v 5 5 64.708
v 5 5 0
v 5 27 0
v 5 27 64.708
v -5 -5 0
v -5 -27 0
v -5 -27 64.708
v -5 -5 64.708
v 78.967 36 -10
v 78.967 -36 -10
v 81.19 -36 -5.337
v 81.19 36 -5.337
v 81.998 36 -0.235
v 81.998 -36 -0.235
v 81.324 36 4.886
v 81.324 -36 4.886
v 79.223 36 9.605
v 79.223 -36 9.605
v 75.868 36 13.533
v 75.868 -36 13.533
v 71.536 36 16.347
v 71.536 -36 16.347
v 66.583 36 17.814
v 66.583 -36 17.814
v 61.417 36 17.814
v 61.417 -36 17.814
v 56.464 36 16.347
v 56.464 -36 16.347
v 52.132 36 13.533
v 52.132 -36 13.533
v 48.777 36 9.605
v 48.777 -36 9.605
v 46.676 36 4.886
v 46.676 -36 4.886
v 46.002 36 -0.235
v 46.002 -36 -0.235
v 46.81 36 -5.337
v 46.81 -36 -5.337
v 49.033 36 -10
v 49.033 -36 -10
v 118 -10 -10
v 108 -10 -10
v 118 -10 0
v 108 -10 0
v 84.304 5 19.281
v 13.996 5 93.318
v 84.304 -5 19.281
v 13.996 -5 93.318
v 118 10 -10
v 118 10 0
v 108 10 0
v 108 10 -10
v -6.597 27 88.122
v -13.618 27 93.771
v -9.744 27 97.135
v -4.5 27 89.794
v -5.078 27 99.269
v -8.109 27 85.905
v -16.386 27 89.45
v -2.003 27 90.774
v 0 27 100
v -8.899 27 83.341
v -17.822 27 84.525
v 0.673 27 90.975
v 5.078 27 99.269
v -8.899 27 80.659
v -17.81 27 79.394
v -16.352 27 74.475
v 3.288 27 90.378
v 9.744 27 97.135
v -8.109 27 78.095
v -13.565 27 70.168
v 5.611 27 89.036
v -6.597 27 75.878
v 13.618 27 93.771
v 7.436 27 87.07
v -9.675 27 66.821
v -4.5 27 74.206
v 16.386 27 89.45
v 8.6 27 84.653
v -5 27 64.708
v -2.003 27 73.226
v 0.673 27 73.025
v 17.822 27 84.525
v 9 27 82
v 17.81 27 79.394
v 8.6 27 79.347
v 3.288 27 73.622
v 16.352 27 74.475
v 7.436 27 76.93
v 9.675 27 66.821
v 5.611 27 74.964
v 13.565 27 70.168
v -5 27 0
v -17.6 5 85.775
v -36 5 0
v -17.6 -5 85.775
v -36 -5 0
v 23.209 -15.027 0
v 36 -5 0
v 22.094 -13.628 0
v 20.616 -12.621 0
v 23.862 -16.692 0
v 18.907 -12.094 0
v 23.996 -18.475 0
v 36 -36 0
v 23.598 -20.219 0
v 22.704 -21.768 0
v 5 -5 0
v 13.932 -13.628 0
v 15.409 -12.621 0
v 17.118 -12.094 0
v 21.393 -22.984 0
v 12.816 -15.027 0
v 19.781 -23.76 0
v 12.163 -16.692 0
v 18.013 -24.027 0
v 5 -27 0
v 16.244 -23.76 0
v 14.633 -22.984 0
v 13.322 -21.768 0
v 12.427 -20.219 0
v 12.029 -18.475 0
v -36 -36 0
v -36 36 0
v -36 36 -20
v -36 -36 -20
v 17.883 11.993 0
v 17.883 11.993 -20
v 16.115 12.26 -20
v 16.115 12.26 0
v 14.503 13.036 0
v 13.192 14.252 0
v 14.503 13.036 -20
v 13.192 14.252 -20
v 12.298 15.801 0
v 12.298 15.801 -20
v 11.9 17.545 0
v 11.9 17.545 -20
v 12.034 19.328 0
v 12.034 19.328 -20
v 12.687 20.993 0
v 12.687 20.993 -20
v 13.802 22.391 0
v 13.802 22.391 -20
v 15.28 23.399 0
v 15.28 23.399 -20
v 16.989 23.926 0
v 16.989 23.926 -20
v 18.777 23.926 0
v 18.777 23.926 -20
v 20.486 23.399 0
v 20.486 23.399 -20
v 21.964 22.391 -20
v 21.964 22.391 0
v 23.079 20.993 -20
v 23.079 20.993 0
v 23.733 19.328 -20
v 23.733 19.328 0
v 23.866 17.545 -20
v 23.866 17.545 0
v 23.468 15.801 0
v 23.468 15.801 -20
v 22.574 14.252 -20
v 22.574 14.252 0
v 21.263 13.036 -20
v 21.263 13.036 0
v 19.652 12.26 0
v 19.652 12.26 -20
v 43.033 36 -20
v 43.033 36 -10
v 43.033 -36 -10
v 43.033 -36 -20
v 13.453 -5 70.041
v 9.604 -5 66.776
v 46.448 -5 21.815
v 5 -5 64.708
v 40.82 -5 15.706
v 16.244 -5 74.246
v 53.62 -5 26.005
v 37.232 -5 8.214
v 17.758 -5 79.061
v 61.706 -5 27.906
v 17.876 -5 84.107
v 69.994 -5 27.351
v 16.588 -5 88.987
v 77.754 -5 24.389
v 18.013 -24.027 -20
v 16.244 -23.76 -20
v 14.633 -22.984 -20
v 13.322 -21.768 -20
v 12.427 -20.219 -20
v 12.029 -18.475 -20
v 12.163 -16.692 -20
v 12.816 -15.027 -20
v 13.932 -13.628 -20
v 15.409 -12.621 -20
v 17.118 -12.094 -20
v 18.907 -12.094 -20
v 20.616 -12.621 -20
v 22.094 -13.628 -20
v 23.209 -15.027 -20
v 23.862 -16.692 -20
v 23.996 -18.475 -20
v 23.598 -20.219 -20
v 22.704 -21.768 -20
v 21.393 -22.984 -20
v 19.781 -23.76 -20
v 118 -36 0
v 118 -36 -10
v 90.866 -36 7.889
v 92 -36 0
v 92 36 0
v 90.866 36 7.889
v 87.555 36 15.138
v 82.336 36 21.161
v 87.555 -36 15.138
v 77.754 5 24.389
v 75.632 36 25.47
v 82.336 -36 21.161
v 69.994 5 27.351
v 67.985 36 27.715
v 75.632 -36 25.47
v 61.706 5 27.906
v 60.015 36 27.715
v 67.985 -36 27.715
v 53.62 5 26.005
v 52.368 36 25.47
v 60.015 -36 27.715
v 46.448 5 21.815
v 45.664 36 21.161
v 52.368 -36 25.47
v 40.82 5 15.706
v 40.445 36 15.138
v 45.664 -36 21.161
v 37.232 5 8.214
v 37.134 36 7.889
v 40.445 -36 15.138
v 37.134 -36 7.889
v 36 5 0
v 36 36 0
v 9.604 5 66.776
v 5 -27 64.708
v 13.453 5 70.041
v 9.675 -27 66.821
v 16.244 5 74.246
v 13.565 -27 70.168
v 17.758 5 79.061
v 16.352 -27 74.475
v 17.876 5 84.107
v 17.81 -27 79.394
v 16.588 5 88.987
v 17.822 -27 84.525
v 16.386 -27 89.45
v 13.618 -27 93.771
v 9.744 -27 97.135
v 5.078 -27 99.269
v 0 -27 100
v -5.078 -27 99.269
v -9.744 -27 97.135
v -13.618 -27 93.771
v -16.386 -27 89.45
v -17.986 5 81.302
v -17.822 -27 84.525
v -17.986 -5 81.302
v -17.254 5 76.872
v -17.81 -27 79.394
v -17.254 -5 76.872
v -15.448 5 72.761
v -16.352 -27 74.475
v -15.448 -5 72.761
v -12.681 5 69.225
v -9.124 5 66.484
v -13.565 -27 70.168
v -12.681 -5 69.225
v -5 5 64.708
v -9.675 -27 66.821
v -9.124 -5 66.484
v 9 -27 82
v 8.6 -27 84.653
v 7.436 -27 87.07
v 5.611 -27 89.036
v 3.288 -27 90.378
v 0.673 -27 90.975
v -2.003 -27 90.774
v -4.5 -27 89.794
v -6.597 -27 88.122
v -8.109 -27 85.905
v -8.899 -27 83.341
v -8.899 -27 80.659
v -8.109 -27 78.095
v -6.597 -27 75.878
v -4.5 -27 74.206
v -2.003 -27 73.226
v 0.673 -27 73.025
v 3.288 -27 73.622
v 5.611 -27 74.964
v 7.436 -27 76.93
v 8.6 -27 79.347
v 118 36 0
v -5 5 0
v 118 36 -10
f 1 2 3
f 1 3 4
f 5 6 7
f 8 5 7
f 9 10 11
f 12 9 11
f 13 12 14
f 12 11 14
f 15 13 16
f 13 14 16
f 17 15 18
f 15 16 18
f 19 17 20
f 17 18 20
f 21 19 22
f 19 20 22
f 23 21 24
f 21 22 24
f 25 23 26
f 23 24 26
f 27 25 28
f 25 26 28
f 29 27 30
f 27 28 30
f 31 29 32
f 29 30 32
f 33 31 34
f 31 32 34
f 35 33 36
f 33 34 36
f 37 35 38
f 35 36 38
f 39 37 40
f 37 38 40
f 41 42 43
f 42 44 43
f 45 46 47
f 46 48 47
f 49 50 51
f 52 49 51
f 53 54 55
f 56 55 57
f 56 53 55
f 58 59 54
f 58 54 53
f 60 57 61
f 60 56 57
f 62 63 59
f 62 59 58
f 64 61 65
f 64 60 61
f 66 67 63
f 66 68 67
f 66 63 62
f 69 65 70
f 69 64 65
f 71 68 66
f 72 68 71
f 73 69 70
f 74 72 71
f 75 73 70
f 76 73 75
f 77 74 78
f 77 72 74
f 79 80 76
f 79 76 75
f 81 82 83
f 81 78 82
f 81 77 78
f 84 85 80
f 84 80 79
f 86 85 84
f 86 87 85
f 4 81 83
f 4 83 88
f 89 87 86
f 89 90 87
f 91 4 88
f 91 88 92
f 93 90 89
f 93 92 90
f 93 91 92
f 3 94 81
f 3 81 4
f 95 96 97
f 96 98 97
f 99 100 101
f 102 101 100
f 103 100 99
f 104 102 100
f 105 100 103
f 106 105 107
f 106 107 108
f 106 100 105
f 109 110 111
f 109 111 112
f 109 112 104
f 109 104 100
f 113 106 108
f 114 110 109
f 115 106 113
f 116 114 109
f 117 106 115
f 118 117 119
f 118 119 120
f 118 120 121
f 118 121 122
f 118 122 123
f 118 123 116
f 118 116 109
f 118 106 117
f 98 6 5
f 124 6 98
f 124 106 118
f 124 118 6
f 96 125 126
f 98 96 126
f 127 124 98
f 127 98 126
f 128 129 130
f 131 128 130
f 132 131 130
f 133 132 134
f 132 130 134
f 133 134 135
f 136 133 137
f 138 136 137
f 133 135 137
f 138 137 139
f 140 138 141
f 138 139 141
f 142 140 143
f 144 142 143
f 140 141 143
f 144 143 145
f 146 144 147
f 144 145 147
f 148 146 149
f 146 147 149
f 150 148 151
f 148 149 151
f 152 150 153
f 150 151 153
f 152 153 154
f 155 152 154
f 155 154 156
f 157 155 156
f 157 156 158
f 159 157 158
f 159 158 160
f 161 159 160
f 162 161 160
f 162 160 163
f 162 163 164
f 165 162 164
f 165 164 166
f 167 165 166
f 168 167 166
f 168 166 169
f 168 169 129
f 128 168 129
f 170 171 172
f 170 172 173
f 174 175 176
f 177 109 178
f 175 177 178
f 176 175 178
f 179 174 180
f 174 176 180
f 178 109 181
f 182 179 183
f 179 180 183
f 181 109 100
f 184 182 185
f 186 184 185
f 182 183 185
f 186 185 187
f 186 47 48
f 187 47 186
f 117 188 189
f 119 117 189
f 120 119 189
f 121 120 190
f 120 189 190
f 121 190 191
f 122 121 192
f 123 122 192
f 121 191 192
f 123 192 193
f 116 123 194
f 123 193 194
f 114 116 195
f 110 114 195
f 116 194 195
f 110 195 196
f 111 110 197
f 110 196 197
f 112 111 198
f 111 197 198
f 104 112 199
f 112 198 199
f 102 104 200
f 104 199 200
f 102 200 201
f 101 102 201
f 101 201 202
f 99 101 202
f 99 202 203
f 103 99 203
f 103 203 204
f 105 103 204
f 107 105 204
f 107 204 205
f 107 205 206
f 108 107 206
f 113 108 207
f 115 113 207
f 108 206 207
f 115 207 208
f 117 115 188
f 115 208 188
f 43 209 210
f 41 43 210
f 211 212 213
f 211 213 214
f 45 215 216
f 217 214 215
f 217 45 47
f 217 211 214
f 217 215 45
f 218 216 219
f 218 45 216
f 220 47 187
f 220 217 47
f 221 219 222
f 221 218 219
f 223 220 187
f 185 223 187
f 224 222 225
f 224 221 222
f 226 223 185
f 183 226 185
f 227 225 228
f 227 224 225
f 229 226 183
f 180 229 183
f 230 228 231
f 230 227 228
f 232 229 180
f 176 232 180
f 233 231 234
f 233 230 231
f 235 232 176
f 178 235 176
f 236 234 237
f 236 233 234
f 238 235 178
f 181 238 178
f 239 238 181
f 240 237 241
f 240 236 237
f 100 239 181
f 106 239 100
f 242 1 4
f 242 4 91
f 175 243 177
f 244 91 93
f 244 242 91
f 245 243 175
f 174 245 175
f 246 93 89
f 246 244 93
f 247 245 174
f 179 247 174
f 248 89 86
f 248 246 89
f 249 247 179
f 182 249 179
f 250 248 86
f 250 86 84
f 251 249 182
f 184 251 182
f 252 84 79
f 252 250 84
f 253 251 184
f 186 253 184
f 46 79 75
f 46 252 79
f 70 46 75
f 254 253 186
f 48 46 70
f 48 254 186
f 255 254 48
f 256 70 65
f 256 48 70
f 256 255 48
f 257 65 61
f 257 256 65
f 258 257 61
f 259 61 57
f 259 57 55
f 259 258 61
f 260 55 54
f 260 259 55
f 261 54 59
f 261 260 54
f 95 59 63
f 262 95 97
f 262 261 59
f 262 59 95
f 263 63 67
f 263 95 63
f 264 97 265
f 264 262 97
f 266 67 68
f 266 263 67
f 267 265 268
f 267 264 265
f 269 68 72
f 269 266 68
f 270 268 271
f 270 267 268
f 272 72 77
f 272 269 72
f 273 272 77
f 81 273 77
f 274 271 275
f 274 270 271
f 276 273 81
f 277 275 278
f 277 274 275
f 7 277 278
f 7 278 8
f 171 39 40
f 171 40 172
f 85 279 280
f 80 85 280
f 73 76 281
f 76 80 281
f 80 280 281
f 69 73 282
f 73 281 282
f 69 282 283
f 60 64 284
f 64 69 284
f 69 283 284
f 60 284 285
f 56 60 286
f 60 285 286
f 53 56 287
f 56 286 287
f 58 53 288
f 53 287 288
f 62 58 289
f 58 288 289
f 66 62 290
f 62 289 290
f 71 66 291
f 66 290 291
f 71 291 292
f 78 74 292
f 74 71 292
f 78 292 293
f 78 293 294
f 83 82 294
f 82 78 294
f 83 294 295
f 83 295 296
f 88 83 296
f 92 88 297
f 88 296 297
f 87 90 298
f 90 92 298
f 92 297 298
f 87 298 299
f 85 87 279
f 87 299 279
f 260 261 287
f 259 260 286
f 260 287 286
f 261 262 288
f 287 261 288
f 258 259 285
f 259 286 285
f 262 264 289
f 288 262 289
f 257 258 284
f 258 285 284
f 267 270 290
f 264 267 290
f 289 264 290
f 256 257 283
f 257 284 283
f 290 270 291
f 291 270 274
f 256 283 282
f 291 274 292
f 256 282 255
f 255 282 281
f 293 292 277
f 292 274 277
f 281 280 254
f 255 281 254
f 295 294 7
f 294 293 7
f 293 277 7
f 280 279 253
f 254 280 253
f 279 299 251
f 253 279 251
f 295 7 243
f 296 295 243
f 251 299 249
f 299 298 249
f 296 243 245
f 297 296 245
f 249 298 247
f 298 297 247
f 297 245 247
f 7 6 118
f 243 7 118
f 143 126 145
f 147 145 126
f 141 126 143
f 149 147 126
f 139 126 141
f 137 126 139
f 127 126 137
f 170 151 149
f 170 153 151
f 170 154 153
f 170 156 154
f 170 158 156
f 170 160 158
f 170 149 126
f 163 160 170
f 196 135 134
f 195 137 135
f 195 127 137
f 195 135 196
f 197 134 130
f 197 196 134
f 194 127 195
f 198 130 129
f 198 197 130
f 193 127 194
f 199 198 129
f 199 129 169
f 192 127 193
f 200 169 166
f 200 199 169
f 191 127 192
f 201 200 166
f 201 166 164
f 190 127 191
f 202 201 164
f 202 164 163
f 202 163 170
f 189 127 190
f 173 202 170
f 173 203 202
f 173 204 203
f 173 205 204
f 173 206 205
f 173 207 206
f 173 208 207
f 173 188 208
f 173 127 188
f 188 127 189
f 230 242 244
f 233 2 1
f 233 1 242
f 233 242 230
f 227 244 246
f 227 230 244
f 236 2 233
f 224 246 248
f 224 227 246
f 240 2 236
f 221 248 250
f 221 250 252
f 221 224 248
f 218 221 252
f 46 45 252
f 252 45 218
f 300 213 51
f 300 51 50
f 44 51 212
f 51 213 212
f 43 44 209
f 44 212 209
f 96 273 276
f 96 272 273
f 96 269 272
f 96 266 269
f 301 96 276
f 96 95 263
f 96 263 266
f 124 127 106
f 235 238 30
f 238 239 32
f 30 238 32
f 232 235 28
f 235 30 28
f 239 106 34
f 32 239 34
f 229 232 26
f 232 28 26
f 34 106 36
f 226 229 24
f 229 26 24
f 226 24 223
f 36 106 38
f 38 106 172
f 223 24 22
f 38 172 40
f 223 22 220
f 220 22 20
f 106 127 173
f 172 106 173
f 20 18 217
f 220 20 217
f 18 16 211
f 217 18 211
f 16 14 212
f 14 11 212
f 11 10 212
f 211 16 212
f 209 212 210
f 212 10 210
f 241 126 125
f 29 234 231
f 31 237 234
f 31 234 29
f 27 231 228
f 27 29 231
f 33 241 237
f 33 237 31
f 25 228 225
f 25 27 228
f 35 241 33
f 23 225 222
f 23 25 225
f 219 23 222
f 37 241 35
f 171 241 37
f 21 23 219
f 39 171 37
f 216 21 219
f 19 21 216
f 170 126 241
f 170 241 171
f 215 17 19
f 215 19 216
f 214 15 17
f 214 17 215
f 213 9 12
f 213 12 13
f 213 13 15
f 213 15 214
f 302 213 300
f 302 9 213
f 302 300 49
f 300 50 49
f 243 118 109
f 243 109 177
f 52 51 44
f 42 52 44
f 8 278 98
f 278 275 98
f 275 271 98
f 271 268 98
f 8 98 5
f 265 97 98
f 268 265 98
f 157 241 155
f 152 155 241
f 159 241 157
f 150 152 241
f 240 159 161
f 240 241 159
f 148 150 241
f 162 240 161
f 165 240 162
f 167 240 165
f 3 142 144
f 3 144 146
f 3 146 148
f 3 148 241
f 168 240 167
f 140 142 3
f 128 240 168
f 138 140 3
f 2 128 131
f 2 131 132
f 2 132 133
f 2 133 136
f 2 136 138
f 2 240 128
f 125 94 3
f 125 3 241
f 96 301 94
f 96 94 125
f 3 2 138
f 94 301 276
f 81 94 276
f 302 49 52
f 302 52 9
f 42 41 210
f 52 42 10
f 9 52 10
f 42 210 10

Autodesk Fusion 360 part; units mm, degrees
sketch "Sketch1" plane through (0, 0, 0) normal (0, 1, 0) x (1, 0, 0)
  line L0 (0, 0) -> (-36, 0)
  line L1 (-36, 0) -> (-36, 20)
  circle A0 centre (0, -82) radius 9
  circle A1 centre (0, -82) radius 18
  line L2 (0, 0) -> (36, 0)
  line L3 (82, 0) -> (118, 0)
  line L4 (118, 0) -> (118, 10)
  line L5 (118, 10) -> (78.9666, 10)
  line L6 (49.0334, 10) -> (43.0334, 10)
  line L7 (43.0334, 10) -> (43.0334, 20)
  line L8 (-36, 20) -> (44.4041, 20)
  arc A2 (44.4041, 20) -> (90.1534, 10) centre (64, 0) ccw
  arc A3 (49.0334, 10) -> (78.9666, 10) centre (64, 0) ccw
  line L9 (12.0259, -95.3932) -> (84.3038, -19.281)
  line L10 (-36, 0) -> (-17.5996, -85.7754)
  line L11 (0, 0) -> (5, 0)
  line L12 (5, 0) -> (5, -64.7084)
  line L13 (0, 0) -> (-5, 0)
  line L14 (-5, 0) -> (-5, -64.7084)
  dimension "d1" = 36
  dimension "d2" = 20
  dimension "d4" = 82
  dimension "d5" = 18
  dimension "d6" = 36
  dimension "d7" = 64
  dimension "d8" = 36
  dimension "d9" = 56
  dimension "d12" = 54
  dimension "d13" = 10
  dimension "d14" = 6
  dimension "d15" = 10
  dimension "d22" = 5
  dimension "d23" = 64.7084
  dimension "d24" = 5
extrude "Extrude1" add sketch "Sketch1" along normal mid plane 72 contours L0 L1 L2 L7 L8 A2 L11 L13 | L3 L6 L7 A2 A3 | L3 L4 L5 A2 | L3 L5 A2 A3 makes body 1
extrude "Extrude2" add sketch "Sketch1" along normal mid plane 54 separate body contours A1 L9 | A1 L9 makes body 2
extrude "Extrude3" add sketch "Sketch1" along normal mid plane 54 contours L0 A1 L2 L11 L12 L13 L14 bodies 2
extrude "Extrude4" add sketch "Sketch1" along normal mid plane 10 contours L0 A1 L10 L14 bodies 1 2
extrude "Extrude5" add sketch "Sketch1" along normal mid plane 10 contours A1 L2 A2 L9 L12 bodies 1
sketch "Sketch4" plane through (0, 0, 0) normal (0, 0, 1) x (1, 0, 0)
  line L0 (0, 0) -> (18, 0)
  line L1 (108, -10) -> (128, -10)
  line L2 (128, -10) -> (128, 10)
  line L3 (128, 10) -> (108, 10)
  line L4 (108, 10) -> (108, -10)
  line L5 (108, -10) -> (128, 10) construction
  line L6 (128, -10) -> (108, 10) construction
  point P0 (118, 0)
  dimension "d31" = 18
  dimension "d40" = 20
  dimension "d41" = 20
hole "Hole1" at (18.0126, -18.0267, 0) direction (0, 0, -1) diameter 12 depth 30 tip angle 118 bodies 1
hole "Hole2" at (17.8831, 17.9931, 0) direction (0, 0, -1) diameter 12 depth 30 tip angle 118 bodies 1
extrude "Extrude6" cut sketch "Sketch4" against normal blind 20 bodies 1
